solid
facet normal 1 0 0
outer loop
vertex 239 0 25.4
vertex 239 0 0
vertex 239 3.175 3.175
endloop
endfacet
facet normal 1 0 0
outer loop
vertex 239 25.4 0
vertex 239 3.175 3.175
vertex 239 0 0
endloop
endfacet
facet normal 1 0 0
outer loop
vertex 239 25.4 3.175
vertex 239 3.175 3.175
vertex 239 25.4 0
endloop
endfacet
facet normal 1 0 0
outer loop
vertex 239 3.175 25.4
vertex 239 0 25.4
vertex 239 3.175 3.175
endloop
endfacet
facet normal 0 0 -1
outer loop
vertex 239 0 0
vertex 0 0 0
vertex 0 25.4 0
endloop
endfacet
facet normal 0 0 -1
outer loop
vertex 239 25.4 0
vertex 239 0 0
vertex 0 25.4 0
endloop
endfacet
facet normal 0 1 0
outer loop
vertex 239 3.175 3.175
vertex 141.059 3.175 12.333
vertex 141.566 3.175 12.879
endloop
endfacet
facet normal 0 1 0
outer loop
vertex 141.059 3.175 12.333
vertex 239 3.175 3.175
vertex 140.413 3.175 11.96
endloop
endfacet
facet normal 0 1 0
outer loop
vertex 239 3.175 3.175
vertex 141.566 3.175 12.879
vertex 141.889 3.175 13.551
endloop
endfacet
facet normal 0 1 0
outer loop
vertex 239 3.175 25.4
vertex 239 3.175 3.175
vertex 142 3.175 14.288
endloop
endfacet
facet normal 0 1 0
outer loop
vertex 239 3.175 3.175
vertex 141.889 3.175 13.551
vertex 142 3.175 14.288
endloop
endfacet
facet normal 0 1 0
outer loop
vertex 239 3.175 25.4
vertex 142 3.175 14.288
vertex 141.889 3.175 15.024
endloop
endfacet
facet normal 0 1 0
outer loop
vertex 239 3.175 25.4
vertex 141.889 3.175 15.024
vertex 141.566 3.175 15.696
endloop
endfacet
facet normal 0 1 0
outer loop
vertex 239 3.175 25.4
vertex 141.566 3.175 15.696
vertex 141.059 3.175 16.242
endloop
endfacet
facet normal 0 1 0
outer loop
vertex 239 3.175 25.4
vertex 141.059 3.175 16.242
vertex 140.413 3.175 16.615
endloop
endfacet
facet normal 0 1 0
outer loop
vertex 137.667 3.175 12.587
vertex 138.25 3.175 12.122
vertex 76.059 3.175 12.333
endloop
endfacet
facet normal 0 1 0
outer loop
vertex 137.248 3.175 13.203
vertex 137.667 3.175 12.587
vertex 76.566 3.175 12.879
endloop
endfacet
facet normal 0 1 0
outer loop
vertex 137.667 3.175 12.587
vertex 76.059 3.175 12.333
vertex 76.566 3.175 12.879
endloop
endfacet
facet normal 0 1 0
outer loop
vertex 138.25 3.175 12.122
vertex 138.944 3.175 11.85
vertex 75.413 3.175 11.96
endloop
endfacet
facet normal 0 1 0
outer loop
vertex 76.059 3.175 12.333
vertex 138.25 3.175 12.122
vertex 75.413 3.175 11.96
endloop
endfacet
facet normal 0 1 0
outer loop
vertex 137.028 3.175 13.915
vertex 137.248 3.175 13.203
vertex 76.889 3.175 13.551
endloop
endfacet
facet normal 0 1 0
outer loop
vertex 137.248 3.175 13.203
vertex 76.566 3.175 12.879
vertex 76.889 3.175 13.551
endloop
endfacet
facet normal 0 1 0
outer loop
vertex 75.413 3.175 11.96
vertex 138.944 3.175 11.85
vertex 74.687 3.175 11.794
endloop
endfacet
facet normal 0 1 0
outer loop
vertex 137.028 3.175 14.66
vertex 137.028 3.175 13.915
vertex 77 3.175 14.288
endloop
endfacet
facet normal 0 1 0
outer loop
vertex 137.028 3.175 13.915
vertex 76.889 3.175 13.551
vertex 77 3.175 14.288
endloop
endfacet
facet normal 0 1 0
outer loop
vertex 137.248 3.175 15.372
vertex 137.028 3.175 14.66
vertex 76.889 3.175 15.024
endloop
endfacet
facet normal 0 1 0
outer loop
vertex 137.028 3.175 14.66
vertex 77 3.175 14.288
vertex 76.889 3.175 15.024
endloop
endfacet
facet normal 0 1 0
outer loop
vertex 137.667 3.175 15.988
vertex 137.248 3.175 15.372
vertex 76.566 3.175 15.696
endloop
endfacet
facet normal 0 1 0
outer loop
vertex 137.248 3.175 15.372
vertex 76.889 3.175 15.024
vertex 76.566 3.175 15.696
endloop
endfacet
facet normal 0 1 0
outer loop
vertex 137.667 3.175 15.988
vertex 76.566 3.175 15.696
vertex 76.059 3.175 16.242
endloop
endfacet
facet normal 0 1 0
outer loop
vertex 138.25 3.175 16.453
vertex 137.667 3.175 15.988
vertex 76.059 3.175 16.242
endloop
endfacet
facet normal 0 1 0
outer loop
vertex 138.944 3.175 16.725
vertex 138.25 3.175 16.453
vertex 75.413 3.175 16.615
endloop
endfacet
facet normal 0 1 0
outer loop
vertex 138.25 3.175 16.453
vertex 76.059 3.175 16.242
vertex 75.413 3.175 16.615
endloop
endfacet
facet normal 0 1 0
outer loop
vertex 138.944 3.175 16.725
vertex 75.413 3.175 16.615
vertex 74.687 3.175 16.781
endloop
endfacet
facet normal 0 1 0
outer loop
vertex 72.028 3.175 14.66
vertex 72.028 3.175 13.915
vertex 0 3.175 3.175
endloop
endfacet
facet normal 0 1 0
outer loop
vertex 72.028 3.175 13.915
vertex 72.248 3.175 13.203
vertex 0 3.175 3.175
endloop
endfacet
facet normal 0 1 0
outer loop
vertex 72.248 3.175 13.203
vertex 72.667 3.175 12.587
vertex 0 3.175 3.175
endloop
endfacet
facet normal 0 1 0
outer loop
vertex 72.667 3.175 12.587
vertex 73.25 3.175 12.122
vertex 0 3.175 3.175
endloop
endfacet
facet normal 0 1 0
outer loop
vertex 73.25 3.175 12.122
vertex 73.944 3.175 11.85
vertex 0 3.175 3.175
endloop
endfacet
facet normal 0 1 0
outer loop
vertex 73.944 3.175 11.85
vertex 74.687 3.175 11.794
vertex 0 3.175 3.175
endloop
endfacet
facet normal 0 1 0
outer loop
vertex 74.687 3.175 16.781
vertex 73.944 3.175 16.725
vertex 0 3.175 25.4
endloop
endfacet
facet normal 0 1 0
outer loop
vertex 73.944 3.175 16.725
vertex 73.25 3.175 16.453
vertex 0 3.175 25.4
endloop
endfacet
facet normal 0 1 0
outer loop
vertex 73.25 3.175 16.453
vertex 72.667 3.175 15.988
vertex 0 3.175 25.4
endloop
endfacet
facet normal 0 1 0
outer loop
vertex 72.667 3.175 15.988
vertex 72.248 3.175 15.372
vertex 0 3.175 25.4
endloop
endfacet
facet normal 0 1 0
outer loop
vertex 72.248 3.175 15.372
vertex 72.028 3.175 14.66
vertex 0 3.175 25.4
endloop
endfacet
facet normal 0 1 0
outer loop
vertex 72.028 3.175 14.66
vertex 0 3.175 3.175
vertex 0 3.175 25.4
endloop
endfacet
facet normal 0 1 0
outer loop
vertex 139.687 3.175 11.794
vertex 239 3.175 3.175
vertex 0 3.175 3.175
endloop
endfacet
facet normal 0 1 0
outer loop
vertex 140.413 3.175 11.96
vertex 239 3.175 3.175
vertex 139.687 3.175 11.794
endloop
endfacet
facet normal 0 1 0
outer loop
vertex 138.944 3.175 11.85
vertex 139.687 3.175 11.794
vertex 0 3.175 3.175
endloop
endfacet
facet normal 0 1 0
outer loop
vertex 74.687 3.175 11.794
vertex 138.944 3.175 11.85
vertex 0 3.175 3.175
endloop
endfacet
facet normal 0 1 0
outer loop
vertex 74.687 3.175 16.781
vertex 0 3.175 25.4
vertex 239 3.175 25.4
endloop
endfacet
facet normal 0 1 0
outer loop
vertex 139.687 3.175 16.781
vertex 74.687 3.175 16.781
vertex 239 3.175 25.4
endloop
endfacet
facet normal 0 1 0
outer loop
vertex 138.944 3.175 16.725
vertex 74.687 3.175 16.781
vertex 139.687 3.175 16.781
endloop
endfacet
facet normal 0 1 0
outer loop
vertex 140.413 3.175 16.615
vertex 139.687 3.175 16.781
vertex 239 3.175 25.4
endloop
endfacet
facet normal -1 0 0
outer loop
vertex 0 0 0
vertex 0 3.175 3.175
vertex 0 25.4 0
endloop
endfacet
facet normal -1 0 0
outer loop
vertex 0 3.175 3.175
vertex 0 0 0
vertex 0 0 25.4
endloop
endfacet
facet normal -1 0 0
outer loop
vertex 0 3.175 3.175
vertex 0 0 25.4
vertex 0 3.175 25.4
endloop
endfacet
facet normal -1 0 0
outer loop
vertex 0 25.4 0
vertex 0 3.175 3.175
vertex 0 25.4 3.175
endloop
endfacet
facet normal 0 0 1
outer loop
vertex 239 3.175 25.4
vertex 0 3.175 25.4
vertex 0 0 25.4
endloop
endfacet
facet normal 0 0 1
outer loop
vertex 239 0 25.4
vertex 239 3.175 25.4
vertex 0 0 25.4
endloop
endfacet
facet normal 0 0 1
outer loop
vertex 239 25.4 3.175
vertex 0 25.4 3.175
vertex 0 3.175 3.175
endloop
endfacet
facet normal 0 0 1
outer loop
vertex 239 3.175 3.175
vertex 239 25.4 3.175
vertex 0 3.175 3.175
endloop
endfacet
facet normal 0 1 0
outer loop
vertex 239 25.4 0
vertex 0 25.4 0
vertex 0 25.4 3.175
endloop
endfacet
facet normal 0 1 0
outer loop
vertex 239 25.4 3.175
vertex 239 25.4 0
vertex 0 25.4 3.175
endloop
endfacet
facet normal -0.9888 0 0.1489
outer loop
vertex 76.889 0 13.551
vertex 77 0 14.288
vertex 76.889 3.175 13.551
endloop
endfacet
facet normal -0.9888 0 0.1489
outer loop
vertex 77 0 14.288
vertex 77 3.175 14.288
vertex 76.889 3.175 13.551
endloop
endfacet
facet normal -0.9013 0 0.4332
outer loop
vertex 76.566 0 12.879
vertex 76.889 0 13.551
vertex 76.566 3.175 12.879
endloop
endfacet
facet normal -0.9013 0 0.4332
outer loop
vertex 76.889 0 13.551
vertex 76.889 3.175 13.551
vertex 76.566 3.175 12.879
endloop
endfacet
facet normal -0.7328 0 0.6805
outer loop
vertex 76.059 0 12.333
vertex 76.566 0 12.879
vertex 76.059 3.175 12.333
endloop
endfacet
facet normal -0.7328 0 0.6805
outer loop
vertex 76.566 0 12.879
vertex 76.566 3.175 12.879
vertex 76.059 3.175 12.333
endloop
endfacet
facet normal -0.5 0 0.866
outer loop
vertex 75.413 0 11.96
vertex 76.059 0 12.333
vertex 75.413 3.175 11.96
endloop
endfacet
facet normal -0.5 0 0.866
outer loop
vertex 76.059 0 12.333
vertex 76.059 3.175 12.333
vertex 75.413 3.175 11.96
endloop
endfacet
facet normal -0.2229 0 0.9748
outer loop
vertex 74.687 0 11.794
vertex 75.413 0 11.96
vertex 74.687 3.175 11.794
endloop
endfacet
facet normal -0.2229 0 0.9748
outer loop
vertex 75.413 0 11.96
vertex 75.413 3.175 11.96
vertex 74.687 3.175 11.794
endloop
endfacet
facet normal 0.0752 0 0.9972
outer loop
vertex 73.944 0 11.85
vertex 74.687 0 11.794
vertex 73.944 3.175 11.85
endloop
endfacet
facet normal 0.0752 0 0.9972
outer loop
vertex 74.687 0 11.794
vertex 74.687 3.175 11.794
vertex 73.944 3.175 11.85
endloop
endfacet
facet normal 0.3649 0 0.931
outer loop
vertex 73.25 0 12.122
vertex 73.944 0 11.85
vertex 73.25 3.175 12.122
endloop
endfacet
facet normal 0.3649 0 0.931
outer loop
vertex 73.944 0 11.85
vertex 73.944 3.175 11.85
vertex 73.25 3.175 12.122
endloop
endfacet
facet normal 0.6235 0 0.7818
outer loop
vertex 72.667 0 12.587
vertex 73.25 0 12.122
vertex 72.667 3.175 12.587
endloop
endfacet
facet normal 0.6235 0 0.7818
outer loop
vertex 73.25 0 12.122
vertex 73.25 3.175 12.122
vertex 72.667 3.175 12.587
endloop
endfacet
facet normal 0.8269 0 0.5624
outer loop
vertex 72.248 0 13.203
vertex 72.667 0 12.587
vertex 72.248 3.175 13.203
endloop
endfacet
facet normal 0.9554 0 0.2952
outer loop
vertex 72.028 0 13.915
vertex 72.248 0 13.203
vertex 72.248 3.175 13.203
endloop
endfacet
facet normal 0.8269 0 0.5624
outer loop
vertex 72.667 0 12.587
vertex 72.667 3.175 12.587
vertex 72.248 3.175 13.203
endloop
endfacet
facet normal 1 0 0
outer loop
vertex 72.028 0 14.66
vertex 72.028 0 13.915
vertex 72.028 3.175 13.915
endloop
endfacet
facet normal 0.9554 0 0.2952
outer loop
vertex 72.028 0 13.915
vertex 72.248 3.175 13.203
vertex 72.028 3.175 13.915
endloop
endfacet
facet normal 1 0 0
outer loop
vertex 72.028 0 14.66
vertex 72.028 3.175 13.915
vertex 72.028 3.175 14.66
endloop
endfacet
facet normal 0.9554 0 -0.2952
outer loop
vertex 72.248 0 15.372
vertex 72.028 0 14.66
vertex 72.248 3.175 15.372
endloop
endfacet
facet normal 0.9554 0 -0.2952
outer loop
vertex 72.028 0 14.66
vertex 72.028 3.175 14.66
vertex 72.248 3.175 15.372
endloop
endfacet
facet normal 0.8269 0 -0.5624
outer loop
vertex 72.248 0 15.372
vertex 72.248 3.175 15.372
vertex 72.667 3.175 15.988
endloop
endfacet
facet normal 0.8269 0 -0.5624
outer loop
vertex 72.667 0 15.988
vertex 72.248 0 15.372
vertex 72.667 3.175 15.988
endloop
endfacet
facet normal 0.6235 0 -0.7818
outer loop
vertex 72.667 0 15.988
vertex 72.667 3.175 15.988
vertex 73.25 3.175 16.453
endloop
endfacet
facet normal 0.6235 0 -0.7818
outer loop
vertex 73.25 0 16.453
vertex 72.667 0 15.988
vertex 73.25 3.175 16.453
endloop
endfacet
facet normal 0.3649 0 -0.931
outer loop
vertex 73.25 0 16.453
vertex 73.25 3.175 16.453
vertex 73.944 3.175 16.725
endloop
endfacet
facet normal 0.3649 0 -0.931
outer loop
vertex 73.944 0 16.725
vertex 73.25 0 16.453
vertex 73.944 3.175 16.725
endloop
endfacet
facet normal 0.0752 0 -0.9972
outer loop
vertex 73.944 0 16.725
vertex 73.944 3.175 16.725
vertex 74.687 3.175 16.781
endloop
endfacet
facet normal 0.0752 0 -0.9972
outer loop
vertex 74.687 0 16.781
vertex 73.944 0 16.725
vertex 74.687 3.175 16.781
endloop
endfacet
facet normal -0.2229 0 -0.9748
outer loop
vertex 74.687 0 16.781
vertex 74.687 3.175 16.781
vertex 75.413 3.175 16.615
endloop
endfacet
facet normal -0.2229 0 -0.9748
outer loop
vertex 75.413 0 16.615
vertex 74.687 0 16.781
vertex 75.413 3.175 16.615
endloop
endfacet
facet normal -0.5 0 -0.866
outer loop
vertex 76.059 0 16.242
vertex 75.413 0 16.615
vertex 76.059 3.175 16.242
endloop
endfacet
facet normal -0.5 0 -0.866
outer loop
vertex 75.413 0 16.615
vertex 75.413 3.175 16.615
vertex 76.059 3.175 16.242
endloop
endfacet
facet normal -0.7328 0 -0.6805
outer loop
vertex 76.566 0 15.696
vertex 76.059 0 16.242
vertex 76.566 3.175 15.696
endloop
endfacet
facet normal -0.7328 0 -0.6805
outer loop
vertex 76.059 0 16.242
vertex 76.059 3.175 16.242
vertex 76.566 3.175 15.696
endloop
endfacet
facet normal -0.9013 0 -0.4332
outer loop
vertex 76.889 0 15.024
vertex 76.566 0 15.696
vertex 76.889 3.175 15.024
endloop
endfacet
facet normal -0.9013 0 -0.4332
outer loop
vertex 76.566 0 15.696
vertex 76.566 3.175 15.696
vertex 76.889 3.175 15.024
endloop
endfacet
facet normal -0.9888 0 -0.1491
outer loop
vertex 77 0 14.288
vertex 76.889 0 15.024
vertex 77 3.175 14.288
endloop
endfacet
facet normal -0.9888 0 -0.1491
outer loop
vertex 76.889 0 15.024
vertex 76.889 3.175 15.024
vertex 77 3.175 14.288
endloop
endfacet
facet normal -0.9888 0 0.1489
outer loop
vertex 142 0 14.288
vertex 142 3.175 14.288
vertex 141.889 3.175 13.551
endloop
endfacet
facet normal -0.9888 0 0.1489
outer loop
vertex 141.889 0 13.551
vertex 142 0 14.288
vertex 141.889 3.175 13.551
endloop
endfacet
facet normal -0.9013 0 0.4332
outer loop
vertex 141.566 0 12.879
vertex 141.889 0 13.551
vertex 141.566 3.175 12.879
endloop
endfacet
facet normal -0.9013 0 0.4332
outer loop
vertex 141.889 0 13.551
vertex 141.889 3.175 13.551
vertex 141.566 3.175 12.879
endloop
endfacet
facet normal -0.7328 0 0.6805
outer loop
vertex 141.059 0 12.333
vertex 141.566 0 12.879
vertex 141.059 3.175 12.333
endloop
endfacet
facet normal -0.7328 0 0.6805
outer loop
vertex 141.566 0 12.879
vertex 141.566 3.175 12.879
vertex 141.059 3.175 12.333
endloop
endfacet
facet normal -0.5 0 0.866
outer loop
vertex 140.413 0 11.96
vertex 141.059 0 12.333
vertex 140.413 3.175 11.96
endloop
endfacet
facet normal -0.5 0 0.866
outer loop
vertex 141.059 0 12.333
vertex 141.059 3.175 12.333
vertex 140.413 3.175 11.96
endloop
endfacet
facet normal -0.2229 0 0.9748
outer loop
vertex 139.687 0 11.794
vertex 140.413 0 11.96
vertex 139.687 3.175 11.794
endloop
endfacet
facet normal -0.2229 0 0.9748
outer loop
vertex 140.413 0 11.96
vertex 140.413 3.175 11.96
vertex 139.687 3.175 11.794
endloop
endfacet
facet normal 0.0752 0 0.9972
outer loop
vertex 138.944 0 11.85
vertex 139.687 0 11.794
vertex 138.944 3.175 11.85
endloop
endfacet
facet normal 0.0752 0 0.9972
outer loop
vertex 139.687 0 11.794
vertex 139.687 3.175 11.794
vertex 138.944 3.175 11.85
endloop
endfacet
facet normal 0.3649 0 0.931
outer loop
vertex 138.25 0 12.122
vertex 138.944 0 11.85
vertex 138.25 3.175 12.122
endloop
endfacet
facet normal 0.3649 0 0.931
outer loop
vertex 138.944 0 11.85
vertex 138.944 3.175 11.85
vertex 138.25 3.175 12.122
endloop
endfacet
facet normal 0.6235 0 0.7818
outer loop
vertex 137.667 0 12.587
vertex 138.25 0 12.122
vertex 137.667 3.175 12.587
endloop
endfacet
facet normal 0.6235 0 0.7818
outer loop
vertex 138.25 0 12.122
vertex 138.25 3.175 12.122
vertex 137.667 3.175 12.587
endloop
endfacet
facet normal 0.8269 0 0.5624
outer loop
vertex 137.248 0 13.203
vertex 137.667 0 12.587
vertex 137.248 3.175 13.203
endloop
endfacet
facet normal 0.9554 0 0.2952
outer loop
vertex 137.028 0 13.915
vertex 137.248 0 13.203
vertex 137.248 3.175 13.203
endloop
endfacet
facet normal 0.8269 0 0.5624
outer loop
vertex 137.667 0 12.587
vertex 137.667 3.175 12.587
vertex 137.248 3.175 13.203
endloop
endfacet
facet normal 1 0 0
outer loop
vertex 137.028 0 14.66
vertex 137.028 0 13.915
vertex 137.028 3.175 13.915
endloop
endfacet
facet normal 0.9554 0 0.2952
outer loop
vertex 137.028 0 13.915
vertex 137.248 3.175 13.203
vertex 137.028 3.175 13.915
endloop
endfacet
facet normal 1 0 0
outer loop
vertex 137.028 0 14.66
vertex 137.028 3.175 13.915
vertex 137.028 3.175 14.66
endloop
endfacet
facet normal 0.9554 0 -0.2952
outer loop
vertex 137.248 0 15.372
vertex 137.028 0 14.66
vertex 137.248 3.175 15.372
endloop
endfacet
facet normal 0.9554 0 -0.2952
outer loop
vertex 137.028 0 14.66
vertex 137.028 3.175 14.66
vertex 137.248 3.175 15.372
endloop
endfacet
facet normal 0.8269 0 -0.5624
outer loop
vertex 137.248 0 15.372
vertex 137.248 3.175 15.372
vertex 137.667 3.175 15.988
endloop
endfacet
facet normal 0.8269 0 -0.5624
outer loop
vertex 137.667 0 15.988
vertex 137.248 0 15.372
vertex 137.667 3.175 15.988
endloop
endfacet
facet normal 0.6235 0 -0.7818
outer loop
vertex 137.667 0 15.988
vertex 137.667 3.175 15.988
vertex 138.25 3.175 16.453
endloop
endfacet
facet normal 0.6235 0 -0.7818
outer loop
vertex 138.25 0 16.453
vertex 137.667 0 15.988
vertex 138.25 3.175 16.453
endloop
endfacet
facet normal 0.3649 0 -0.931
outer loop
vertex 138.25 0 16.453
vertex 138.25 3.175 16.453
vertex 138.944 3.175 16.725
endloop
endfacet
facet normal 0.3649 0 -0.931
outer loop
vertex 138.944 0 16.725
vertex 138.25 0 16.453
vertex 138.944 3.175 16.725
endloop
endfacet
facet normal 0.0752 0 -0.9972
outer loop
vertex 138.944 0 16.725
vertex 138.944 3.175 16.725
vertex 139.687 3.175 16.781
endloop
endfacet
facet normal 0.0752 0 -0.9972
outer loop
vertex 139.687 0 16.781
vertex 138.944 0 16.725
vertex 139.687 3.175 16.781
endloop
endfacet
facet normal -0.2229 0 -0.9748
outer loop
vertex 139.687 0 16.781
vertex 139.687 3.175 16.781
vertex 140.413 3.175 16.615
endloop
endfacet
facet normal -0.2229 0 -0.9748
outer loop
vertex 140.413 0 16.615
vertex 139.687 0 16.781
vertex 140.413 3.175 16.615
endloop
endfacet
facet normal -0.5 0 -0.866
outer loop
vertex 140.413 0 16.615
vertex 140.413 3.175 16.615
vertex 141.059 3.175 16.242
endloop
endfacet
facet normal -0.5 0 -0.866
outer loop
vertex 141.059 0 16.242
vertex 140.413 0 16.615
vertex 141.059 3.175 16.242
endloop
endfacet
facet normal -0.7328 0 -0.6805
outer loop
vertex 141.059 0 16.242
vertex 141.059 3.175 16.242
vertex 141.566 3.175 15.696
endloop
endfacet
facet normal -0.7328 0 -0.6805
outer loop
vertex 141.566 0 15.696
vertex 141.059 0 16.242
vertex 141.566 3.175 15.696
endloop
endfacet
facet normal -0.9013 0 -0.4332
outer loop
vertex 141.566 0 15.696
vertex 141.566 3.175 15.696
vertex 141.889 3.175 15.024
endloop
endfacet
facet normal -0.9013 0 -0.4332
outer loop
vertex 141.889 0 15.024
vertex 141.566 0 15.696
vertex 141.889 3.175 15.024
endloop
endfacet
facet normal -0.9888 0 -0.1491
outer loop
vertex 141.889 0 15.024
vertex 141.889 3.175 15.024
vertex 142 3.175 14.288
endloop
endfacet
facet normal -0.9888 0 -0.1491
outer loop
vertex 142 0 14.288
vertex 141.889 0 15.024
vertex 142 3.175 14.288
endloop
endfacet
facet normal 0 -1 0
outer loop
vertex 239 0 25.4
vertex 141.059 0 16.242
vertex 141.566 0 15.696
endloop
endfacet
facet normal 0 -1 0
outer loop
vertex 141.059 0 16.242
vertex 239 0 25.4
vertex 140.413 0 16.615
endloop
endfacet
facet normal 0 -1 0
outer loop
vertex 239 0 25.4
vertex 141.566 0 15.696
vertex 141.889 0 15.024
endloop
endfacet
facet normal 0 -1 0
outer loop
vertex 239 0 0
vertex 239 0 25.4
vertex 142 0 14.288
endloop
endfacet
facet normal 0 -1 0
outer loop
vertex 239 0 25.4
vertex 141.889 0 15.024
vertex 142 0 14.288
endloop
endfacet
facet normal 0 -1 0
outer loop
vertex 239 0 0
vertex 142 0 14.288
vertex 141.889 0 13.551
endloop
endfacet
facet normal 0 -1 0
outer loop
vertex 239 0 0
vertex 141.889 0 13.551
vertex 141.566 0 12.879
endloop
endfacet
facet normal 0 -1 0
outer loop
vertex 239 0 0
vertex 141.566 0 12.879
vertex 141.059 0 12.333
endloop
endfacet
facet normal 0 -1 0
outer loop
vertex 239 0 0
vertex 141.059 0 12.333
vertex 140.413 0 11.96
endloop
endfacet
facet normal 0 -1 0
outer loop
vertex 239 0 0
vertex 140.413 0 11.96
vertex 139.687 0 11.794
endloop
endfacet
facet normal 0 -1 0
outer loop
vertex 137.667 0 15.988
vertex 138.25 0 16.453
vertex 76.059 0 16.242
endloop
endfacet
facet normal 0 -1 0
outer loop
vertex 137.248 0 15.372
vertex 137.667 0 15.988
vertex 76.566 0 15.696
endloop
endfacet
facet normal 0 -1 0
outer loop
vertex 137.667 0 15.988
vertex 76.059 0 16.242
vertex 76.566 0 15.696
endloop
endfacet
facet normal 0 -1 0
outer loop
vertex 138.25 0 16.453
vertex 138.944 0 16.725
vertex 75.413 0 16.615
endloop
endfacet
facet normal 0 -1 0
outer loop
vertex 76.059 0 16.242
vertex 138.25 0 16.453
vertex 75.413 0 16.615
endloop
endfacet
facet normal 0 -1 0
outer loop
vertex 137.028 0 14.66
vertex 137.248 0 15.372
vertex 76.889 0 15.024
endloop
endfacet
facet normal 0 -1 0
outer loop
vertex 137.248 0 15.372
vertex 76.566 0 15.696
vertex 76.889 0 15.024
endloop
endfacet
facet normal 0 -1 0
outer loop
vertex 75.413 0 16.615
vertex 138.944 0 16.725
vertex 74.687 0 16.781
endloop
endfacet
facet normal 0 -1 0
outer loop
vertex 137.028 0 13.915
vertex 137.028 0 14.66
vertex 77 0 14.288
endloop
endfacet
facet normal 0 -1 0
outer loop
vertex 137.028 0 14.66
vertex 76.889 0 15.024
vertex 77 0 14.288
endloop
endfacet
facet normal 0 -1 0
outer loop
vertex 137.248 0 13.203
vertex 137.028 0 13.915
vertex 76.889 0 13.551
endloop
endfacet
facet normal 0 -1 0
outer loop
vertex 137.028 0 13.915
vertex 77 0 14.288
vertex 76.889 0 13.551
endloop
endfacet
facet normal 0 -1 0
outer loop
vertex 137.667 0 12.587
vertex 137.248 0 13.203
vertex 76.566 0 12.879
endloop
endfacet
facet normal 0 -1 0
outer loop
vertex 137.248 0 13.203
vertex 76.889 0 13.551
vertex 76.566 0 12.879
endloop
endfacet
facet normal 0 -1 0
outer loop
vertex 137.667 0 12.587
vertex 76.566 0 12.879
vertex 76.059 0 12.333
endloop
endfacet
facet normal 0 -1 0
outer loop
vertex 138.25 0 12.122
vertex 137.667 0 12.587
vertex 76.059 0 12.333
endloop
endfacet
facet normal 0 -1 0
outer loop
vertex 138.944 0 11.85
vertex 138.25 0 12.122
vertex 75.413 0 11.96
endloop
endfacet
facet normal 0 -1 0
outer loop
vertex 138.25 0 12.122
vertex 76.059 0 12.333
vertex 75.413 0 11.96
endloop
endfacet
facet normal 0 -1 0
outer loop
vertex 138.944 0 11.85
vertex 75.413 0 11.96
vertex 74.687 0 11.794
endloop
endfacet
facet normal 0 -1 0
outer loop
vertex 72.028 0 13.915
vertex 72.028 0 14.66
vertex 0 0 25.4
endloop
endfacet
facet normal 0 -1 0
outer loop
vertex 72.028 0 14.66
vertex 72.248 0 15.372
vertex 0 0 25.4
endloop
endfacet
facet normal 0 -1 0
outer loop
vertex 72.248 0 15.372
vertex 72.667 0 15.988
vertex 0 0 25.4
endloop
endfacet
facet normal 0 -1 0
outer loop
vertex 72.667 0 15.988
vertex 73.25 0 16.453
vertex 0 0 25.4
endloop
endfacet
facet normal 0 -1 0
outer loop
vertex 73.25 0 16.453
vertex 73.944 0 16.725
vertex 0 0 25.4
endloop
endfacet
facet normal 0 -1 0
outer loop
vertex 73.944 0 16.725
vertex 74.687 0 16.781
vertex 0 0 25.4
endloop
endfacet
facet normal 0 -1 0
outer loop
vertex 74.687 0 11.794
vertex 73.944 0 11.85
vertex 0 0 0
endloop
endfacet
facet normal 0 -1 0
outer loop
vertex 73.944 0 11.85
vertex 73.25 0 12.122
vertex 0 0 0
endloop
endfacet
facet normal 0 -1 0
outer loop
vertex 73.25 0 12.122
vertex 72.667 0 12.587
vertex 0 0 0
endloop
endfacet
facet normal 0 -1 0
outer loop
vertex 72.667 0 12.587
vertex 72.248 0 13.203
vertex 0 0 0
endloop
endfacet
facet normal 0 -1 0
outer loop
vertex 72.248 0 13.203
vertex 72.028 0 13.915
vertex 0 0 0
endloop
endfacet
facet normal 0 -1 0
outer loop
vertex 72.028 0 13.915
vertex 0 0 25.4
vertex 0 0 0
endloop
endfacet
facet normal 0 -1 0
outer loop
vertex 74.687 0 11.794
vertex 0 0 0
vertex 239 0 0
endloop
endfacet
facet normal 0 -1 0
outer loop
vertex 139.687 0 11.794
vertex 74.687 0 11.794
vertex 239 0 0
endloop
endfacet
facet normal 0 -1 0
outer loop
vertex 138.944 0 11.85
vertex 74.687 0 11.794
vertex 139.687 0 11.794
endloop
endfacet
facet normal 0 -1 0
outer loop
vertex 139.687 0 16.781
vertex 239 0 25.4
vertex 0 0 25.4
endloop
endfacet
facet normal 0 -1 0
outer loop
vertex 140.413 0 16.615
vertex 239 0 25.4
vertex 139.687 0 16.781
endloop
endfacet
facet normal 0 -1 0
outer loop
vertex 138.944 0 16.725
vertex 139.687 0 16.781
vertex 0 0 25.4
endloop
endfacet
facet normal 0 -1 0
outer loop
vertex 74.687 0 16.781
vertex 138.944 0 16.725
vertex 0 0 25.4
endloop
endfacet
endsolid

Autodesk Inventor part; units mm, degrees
ref_plane "YZ Plane" through (0, 0, 0) normal (1, 0, 0) x (0, 1, 0)
ref_plane "XZ Plane" through (0, 0, 0) normal (0, 1, 0) x (-1, 0, 0)
ref_plane "XY Plane" through (0, 0, 0) normal (0, 0, 1) x (1, 0, 0)
sketch "Sketch1" plane through (0, 0, 0) normal (1, 0, 0) x (0, 1, 0)
  line L0 (0, 0) -> (25.4, 0)
  line L1 (25.4, 0) -> (25.4, 3.175)
  line L2 (25.4, 3.175) -> (0, 3.175)
  line L3 (0, 3.175) -> (0, 0)
  line L4 (0, 0) -> (3.175, 0)
  line L5 (3.175, 0) -> (3.175, 25.4)
  line L6 (3.175, 25.4) -> (0, 25.4)
  line L7 (0, 25.4) -> (0, 0)
  point P0 (3.175, 3.175)
  dimension "d0" = 25.4
  dimension "d1" = 3.175
  dimension "d2" = 3.175
  dimension "d3" = 25.4
extrude "Extrusion1" add sketch "Sketch1" along normal blind 239
sketch "Sketch2" plane through (0, 3.175, 25.4) normal (0, 1, 0) x (1, 0, 0)
  line L0 (0, 22.225) -> (0, 0) projected
  line L1 (0, 0) -> (239, 0) projected
  line L2 (239, 22.225) -> (239, 0) projected
  line L3 (0, 22.225) -> (239, 22.225) projected
  line L4 (0, 11.1125) -> (74.5, 11.1125)
  line L5 (74.5, 11.1125) -> (139.5, 11.1125)
  circle A0 centre (139.5, 11.1125) radius 2.5
  circle A1 centre (74.5, 11.1125) radius 2.5
  point P0 (0, 25.4)
  dimension "d6" = 74.5
  dimension "d7" = 65
  dimension "d9" = 5
  dimension "d12" = 5
extrude "Extrusion2" cut sketch "Sketch2" against normal blind 10 contours A0 | A1 L5 L4 | L4 L5 A1
properties part number "PERFIL_SOPORTE DEL MOTOR"
